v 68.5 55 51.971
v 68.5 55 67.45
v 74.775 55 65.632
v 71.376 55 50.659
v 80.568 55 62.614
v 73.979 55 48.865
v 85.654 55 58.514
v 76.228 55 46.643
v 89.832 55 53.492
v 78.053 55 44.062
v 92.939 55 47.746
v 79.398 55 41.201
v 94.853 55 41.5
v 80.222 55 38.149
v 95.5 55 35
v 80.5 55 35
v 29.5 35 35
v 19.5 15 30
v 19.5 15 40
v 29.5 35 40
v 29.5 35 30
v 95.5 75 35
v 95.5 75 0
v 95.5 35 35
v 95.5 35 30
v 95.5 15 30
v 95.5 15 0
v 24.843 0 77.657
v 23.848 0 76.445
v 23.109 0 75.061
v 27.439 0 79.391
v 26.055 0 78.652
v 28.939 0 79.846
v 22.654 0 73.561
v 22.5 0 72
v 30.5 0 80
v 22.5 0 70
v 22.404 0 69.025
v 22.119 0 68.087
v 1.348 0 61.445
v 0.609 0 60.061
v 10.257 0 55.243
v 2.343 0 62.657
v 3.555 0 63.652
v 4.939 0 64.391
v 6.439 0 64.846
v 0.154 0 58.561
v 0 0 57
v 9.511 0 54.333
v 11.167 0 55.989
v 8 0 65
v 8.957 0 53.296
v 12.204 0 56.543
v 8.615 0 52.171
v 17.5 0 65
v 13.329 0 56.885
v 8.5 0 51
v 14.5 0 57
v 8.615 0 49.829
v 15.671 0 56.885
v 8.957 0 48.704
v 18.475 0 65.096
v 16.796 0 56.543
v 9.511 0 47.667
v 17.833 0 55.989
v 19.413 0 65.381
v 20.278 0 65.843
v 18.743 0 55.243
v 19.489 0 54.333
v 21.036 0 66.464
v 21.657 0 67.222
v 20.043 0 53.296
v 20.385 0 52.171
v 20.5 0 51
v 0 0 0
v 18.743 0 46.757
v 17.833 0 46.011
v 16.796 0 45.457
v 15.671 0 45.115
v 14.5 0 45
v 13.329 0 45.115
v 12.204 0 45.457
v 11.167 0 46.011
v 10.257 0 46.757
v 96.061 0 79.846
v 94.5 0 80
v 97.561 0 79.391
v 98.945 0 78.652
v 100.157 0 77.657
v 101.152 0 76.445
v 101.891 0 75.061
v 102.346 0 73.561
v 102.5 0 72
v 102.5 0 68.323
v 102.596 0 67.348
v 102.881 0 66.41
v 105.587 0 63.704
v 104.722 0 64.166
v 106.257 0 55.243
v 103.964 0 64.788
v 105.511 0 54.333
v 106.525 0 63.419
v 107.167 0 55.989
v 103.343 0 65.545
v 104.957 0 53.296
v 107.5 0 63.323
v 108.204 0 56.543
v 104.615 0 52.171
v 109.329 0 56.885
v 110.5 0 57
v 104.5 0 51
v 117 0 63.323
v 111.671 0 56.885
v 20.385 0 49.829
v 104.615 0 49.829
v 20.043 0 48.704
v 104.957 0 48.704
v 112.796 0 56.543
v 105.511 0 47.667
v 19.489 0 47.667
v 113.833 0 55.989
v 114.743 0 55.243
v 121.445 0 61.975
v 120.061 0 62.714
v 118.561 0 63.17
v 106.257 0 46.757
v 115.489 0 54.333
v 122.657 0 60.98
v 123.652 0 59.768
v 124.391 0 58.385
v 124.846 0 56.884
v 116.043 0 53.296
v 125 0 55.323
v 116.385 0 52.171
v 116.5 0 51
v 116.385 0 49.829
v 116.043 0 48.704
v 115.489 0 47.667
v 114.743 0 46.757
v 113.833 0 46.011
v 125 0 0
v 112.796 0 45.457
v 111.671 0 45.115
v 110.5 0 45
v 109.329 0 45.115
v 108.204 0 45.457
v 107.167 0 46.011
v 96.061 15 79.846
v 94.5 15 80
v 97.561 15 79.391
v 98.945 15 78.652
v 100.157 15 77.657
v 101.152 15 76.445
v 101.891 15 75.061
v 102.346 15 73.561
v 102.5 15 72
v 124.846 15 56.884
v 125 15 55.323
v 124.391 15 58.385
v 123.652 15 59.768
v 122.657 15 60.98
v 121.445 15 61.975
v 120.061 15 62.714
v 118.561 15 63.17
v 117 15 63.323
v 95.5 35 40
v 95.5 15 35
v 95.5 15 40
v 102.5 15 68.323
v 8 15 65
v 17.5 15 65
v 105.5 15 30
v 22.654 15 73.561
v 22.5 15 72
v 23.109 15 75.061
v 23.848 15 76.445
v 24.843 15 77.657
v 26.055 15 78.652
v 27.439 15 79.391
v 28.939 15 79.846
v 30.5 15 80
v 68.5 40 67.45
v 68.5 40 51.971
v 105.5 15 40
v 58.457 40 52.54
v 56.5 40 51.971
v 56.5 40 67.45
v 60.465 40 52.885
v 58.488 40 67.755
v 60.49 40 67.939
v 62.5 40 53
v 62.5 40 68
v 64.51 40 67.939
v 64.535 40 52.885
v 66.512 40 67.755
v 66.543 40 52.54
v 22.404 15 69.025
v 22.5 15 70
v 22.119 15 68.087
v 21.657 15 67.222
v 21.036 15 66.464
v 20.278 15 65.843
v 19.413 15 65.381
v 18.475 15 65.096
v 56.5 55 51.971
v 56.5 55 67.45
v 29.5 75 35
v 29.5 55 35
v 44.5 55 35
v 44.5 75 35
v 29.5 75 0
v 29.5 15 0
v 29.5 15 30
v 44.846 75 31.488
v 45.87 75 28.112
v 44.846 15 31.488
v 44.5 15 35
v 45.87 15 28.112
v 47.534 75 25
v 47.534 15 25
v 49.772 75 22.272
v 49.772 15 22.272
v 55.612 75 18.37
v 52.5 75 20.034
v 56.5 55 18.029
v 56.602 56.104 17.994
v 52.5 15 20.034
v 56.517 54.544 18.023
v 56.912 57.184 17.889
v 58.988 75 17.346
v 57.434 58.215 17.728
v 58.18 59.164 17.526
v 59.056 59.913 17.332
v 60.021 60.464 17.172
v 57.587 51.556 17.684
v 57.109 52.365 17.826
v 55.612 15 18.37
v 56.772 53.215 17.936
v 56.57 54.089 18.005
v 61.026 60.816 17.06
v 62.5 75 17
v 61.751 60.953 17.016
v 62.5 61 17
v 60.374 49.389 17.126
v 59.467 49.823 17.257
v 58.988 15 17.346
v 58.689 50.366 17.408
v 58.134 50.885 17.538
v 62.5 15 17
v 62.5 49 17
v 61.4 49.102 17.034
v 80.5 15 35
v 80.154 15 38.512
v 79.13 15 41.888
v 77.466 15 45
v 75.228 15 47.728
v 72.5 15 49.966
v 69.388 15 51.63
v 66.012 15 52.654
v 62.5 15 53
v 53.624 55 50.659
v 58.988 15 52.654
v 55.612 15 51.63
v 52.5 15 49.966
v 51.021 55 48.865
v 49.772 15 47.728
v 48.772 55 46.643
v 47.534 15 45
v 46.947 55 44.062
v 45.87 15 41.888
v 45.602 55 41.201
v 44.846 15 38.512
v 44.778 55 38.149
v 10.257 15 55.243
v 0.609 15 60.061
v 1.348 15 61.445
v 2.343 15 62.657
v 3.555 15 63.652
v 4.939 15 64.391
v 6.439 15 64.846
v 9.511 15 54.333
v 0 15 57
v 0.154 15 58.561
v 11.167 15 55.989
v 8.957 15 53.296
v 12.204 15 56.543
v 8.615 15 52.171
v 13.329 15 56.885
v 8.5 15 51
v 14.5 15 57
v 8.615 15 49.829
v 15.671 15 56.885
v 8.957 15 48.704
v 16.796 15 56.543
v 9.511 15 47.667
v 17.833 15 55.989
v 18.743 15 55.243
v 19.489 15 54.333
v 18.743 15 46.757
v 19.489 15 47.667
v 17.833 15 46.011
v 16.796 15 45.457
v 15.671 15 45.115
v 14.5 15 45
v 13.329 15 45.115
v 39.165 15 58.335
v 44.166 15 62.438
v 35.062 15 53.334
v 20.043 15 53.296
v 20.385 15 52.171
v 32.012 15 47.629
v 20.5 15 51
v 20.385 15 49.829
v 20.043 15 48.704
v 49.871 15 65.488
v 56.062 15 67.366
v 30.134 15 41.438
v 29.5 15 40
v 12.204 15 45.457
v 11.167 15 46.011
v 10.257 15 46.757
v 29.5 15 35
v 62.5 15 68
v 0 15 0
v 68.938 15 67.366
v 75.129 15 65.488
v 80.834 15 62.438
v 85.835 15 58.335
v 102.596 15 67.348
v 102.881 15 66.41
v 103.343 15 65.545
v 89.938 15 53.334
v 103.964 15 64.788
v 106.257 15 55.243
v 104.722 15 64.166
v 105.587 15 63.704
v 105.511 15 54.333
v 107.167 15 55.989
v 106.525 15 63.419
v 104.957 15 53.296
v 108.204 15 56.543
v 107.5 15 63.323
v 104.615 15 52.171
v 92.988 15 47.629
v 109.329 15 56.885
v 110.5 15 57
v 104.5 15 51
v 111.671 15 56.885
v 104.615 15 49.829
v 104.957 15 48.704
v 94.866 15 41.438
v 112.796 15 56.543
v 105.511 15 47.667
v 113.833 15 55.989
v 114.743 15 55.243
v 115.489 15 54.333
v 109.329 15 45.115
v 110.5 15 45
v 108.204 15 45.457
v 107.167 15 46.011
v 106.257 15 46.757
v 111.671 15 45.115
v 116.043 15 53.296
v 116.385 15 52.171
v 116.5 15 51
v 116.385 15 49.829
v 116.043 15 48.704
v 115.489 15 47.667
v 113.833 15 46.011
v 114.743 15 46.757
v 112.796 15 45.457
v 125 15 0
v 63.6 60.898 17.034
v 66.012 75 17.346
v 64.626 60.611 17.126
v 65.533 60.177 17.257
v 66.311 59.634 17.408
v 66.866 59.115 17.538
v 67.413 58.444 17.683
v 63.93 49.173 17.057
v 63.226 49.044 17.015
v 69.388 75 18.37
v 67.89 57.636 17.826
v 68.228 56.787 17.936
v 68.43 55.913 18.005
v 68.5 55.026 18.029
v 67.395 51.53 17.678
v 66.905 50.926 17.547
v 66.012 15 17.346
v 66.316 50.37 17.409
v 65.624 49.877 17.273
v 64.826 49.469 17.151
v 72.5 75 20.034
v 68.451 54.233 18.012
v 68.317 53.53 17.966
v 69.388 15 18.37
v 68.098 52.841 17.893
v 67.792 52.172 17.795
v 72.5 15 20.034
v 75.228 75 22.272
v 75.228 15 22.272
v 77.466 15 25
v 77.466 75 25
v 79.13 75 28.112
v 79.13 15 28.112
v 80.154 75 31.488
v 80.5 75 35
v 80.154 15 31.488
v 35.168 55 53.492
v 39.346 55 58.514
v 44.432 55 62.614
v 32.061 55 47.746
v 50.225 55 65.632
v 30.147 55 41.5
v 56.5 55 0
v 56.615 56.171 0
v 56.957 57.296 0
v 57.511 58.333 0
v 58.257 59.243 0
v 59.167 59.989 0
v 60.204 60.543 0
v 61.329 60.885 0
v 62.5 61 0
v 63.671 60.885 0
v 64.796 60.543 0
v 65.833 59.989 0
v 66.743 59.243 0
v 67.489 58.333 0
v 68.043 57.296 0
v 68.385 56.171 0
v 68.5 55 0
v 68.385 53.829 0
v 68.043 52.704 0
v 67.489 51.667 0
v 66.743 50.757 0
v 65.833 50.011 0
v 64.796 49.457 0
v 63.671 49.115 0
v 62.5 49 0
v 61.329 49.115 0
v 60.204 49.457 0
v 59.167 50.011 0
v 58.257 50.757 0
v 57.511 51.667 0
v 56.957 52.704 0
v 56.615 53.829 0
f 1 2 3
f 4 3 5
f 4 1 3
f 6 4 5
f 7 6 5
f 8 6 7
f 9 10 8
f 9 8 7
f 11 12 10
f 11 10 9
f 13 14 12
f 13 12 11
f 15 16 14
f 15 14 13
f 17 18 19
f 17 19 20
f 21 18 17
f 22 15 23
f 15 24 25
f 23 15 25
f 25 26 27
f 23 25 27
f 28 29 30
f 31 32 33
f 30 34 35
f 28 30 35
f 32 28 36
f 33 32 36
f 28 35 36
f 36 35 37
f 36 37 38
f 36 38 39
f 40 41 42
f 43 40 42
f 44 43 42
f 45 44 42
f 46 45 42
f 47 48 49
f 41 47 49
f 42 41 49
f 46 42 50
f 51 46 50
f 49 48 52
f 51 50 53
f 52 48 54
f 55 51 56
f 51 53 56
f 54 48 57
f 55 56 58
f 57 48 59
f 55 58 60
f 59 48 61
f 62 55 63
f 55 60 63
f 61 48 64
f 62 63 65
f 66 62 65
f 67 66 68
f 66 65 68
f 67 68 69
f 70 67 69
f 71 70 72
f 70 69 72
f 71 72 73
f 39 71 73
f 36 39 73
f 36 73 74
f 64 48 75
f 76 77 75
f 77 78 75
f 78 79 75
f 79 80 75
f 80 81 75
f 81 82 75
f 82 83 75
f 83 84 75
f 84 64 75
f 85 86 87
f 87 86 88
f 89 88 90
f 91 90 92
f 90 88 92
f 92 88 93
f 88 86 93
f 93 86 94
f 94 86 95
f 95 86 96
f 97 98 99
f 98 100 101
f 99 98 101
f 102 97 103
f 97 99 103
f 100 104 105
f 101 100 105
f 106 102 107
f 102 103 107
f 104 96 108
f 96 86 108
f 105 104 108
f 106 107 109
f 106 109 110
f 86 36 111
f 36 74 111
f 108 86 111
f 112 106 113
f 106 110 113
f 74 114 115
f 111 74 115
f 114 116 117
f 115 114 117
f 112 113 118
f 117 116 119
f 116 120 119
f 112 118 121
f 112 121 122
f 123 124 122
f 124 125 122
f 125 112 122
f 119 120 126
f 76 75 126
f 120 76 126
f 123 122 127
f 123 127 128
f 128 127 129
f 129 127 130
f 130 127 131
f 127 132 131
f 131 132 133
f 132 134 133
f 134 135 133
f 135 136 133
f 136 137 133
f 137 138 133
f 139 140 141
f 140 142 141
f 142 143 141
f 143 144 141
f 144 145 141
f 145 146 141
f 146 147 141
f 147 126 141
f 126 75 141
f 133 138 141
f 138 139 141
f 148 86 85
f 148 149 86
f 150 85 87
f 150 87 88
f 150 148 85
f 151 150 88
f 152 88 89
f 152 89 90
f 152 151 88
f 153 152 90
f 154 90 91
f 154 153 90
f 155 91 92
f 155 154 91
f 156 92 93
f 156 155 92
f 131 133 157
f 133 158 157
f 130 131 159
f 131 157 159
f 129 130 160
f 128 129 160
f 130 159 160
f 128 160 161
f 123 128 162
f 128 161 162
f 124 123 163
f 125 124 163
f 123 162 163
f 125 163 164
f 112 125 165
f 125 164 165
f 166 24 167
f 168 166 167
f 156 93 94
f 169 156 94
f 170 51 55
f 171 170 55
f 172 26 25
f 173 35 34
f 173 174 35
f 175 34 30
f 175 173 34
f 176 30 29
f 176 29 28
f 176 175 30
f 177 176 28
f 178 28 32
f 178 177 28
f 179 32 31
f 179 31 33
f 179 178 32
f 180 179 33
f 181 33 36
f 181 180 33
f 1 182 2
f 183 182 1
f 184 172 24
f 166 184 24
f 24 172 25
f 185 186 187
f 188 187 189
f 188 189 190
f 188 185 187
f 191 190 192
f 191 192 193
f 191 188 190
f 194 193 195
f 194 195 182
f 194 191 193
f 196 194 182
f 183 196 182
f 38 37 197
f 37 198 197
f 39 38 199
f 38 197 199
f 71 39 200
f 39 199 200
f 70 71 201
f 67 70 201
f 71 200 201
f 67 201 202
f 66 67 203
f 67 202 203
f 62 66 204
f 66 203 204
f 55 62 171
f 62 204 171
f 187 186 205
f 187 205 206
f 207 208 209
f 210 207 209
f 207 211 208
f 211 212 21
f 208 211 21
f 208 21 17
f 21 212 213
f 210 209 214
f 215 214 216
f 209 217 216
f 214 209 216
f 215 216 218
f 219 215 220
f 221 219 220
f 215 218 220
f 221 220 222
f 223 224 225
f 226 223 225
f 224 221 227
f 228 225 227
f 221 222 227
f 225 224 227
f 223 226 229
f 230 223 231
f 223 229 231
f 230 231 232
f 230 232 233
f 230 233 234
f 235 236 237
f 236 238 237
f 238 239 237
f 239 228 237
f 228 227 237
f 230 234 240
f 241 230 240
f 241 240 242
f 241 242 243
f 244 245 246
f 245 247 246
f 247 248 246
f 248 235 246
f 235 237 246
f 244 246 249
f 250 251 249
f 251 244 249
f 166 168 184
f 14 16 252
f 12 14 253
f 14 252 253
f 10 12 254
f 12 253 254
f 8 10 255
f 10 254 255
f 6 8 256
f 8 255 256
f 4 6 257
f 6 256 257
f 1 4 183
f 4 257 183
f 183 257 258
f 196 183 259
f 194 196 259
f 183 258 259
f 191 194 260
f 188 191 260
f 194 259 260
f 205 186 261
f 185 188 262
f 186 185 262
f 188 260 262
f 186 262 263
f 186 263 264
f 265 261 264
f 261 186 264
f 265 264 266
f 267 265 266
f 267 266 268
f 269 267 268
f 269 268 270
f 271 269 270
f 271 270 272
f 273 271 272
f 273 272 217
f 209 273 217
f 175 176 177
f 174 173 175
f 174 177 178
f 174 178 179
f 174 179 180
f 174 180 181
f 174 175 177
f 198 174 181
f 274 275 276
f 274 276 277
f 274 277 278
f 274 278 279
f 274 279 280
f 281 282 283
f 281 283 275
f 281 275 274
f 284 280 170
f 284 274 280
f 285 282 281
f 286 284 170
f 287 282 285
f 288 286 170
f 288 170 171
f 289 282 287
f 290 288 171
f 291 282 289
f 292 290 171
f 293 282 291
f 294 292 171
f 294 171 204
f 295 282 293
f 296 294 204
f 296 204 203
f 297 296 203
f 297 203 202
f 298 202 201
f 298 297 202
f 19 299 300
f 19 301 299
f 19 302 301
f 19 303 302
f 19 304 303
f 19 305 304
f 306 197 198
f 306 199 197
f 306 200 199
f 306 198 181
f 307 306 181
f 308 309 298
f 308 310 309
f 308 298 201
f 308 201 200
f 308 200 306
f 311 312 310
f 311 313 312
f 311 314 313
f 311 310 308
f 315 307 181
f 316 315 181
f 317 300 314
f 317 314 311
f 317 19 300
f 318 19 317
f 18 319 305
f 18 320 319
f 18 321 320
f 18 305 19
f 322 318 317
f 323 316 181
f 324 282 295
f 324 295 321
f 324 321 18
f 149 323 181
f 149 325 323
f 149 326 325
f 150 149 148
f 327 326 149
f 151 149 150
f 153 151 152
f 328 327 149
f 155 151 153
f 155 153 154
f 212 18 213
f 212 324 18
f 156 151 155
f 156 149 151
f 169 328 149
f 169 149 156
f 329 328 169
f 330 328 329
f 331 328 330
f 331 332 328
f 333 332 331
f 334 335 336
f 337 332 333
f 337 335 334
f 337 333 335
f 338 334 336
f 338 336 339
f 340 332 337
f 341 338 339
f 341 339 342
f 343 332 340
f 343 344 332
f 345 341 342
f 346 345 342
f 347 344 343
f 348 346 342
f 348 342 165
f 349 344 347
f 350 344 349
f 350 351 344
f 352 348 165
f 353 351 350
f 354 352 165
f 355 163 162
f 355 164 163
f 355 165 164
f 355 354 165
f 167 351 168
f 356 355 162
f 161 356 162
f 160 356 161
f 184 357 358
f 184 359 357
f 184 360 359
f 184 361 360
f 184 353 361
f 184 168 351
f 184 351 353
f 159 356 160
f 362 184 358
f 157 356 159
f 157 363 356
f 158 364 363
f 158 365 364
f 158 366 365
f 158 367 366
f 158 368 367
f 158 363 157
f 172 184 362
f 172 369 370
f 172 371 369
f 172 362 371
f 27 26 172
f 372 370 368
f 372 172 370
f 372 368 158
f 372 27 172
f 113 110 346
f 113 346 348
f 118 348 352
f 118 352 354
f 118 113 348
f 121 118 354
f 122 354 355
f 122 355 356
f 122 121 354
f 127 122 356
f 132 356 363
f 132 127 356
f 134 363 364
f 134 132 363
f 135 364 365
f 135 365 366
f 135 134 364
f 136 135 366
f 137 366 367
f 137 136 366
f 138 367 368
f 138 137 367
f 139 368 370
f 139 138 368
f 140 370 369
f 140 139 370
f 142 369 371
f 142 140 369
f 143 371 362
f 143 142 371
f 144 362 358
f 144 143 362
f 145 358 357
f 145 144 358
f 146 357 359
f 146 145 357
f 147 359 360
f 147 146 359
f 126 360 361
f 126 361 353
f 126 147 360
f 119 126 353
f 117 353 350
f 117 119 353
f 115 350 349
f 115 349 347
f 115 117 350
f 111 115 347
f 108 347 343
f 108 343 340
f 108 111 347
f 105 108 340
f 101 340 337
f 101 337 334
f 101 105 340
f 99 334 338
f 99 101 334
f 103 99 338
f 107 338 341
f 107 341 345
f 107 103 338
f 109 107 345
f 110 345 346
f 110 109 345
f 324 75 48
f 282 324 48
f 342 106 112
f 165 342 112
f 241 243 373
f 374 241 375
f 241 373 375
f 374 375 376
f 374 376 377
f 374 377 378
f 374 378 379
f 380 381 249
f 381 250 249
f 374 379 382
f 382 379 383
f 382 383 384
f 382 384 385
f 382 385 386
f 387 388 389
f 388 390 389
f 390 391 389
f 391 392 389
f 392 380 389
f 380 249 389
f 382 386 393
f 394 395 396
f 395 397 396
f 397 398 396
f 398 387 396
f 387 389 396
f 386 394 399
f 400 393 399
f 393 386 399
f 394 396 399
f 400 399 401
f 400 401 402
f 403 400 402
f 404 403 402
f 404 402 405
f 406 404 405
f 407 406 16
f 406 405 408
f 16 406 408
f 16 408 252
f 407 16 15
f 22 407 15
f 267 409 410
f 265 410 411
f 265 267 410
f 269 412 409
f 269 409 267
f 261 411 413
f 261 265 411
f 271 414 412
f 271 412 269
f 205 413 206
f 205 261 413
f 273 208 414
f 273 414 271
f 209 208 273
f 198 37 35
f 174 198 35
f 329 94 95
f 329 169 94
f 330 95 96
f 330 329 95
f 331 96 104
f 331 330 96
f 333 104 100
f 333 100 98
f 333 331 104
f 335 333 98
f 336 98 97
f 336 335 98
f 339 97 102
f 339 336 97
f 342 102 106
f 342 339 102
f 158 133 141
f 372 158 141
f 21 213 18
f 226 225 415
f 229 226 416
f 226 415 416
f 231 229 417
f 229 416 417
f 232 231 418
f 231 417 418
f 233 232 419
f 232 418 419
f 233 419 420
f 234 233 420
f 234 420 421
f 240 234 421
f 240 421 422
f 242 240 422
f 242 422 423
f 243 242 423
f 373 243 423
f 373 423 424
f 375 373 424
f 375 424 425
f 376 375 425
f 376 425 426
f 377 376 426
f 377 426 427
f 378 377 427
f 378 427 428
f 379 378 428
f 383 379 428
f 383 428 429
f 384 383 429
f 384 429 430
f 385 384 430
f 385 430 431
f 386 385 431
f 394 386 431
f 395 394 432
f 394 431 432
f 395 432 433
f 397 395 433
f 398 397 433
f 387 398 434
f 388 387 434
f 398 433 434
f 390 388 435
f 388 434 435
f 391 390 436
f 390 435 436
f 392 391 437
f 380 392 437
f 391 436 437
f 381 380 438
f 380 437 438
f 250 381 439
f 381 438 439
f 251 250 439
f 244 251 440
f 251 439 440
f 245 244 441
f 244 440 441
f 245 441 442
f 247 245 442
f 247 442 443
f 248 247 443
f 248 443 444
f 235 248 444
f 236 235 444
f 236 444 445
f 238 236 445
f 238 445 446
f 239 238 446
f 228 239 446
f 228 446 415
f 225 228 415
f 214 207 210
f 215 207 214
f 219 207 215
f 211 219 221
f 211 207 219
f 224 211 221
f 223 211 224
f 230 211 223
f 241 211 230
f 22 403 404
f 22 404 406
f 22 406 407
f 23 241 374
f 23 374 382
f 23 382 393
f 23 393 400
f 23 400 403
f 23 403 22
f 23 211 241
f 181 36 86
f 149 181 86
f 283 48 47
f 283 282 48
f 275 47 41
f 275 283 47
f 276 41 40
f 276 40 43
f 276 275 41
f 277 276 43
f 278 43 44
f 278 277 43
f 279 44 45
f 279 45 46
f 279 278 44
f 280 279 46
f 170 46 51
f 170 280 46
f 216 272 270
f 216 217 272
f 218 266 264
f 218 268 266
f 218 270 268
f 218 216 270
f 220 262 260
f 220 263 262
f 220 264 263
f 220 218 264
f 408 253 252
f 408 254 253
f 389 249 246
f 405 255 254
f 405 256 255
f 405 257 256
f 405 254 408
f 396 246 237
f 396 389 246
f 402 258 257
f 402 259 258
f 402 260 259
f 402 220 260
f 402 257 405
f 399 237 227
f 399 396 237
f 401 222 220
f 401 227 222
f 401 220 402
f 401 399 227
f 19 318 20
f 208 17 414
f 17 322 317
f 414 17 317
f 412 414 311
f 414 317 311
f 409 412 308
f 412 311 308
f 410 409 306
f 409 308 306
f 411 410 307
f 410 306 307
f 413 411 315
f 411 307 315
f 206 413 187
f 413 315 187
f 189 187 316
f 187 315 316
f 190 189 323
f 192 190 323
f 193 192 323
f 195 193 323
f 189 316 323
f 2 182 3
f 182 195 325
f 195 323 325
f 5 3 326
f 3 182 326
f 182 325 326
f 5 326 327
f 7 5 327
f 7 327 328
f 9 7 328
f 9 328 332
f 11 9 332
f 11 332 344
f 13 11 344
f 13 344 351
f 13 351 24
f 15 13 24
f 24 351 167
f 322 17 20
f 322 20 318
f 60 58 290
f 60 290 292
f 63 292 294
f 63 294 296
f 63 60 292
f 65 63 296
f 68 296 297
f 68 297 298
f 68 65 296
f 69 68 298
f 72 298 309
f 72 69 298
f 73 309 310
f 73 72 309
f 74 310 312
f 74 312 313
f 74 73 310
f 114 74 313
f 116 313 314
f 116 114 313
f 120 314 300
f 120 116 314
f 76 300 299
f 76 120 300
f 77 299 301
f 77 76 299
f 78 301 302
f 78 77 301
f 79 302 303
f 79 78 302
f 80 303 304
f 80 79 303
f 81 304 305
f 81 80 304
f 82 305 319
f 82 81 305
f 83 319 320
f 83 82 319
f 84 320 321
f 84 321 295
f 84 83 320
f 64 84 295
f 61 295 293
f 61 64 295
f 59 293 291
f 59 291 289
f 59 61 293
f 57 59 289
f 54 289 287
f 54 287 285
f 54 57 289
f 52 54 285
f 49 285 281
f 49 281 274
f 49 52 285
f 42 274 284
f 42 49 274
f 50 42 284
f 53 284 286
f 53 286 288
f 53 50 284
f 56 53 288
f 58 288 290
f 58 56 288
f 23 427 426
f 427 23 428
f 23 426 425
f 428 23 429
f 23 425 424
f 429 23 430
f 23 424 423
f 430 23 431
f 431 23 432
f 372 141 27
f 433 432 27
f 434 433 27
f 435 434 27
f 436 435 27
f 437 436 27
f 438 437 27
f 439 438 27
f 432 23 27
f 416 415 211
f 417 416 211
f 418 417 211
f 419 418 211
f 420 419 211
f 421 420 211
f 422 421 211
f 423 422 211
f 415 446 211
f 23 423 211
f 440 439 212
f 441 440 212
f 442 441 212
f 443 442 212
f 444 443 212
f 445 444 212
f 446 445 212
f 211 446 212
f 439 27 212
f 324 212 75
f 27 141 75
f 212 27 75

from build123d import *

# Parameters (mm, degrees)
SKETCH_1_R               = 6
EXTRUDE_1_DEPTH          = 15
FILLET_1_R               = 8
FILLET_2_R               = 8
FILLET_3_R               = 5
EXTRUDE_3_DEPTH          = 60
CUT_EXTRUDE_START        = -20
SKETCH_5_R               = 18
CUT_EXTRUDE_1_DEPTH      = 20
CUT_EXTRUDE_START_2      = -15
CUT_EXTRUDE_2_DEPTH      = 15
CUT_EXTRUDE_3_REACH      = 168.283
CUT_EXTRUDE_3_END_RADIUS = 18
SKETCH_7_R               = 6
EXTRUDE_4_DEPTH          = 10


with BuildPart() as part:
    # 草图1 → 凸台-拉伸1 (new body)
    with BuildSketch(Plane(origin=(0, 0, 0), x_dir=(1, 0, 0), z_dir=(0, 1, 0))):
        Polygon((0, 0), (0, -65), (22.5, -65), (22.5, -80), (102.5, -80), (102.5, -63.32326284), (125, -63.32326284), (125, 0), align=None)
        with Locations(Location((14.5, -51, 0), (0, 0, 270))):
            Circle(SKETCH_1_R, mode=Mode.SUBTRACT)
        with Locations(Location((110.5, -51, 0), (0, 0, 270))):
            Circle(SKETCH_1_R, mode=Mode.SUBTRACT)
    extrude(amount=EXTRUDE_1_DEPTH)

    # 圆角1
    fillet_1_edges = [part.edges().sort_by_distance(p)[0] for p in [
        (125, 7.5, 63.32326284),
        (0, 7.5, 65),
    ]]
    fillet(fillet_1_edges, radius=FILLET_1_R)

    # 圆角2
    fillet_2_edges = [part.edges().sort_by_distance(p)[0] for p in [
        (102.5, 7.5, 80),
        (22.5, 7.5, 80),
    ]]
    fillet(fillet_2_edges, radius=FILLET_2_R)

    # 圆角3
    fillet_3_edges = [part.edges().sort_by_distance(p)[0] for p in [
        (102.5, 7.5, 63.32326284),
        (22.5, 7.5, 65),
    ]]
    fillet(fillet_3_edges, radius=FILLET_3_R)

    # 草图2 → 凸台-拉伸3 (add)
    with BuildSketch(Plane(origin=(0, 15, 0), x_dir=(1, 0, 0), z_dir=(0, 1, 0))):
        with BuildLine():
            Line((95.5, 0), (62.5, 0))
            Line((62.5, 0), (62.5, -17))
            ThreePointArc((62.5, -17), (75.227922061, -22.272077939), (80.5, -35))
            Line((80.5, -35), (95.5, -35))
            Line((95.5, -35), (95.5, 0))
        make_face()
        with BuildLine():
            Line((62.5, -17), (62.5, 0))
            Line((62.5, 0), (29.5, 0))
            Line((29.5, 0), (29.5, -35))
            Line((29.5, -35), (44.5, -35))
            ThreePointArc((44.5, -35), (49.772077939, -22.272077939), (62.5, -17))
        make_face()
        with BuildLine():
            Line((95.5, -35), (80.5, -35))
            ThreePointArc((80.5, -35), (62.5, -53), (44.5, -35))
            Line((44.5, -35), (29.5, -35))
            ThreePointArc((29.5, -35), (62.5, -68), (95.5, -35))
        make_face()
    extrude(amount=EXTRUDE_3_DEPTH)

    # 草图5 → 切除-拉伸1 (cut)
    with BuildSketch(Plane(origin=(0, 75, 0), x_dir=(1, 0, 0), z_dir=(0, 1, 0)).offset(CUT_EXTRUDE_START)):
        with Locations((62.5, -35)):
            Circle(SKETCH_5_R)
        with BuildLine():
            Line((29.5, -35), (95.5, -35))
            ThreePointArc((95.5, -35), (62.5, -68), (29.5, -35))
        make_face()
    extrude(amount=CUT_EXTRUDE_1_DEPTH, mode=Mode.SUBTRACT)

    # 草图6 → 切除-拉伸2 (cut)
    with BuildSketch(Plane(origin=(0, 55, 0), x_dir=(1, 0, 0), z_dir=(0, 1, 0)).offset(CUT_EXTRUDE_START_2)):
        with BuildLine():
            Line((56.5, -51.970562748), (56.5, -67.449961479))
            ThreePointArc((56.5, -67.449961479), (59.487420442, -67.862202671), (62.5, -68))
            Line((62.5, -68), (62.5, -53))
            ThreePointArc((62.5, -53), (59.456164383, -52.740774074), (56.5, -51.970562748))
        make_face()
        with BuildLine():
            Line((62.5, -53), (62.5, -68))
            ThreePointArc((62.5, -68), (65.512579558, -67.862202671), (68.5, -67.449961479))
            Line((68.5, -67.449961479), (68.5, -51.970562748))
            ThreePointArc((68.5, -51.970562748), (65.543835617, -52.740774074), (62.5, -53))
        make_face()
    extrude(amount=CUT_EXTRUDE_2_DEPTH, mode=Mode.SUBTRACT)

    # 切除-拉伸3: up to this cylinder (the profile starts outside it)
    cut_extrude_3_end = Plane(origin=(62.5, 55, 35), z_dir=(0, -1, 0)) * Cylinder(CUT_EXTRUDE_3_END_RADIUS, 373.566, mode=Mode.PRIVATE)
    # 草图7 → 切除-拉伸3 (cut, up to the surface)
    with BuildSketch(Plane(origin=(0, 0, 0), x_dir=(-1, 0, 0), z_dir=(0, 0, -1)), mode=Mode.PRIVATE) as cut_extrude_3_sk1:
        with Locations((-62.5, 55)):
            Circle(SKETCH_7_R)
    cut_extrude_3_tool1 = extrude(cut_extrude_3_sk1.sketch, amount=-CUT_EXTRUDE_3_REACH, mode=Mode.PRIVATE) - cut_extrude_3_end
    add(cut_extrude_3_tool1.solids().sort_by_distance((62.5, 55, 0))[0], mode=Mode.SUBTRACT)

    # 草图10 → 凸台-拉伸4 (add)
    with BuildSketch(Plane(origin=(0, 0, 30), x_dir=(-1, 0, 0), z_dir=(0, 0, -1))):
        Polygon((-95.5, 15), (-105.5, 15), (-95.5, 35), align=None)
        Polygon((-19.5, 15), (-29.5, 35), (-29.5, 15), align=None)
    extrude(amount=-EXTRUDE_4_DEPTH)


solid = part.part
